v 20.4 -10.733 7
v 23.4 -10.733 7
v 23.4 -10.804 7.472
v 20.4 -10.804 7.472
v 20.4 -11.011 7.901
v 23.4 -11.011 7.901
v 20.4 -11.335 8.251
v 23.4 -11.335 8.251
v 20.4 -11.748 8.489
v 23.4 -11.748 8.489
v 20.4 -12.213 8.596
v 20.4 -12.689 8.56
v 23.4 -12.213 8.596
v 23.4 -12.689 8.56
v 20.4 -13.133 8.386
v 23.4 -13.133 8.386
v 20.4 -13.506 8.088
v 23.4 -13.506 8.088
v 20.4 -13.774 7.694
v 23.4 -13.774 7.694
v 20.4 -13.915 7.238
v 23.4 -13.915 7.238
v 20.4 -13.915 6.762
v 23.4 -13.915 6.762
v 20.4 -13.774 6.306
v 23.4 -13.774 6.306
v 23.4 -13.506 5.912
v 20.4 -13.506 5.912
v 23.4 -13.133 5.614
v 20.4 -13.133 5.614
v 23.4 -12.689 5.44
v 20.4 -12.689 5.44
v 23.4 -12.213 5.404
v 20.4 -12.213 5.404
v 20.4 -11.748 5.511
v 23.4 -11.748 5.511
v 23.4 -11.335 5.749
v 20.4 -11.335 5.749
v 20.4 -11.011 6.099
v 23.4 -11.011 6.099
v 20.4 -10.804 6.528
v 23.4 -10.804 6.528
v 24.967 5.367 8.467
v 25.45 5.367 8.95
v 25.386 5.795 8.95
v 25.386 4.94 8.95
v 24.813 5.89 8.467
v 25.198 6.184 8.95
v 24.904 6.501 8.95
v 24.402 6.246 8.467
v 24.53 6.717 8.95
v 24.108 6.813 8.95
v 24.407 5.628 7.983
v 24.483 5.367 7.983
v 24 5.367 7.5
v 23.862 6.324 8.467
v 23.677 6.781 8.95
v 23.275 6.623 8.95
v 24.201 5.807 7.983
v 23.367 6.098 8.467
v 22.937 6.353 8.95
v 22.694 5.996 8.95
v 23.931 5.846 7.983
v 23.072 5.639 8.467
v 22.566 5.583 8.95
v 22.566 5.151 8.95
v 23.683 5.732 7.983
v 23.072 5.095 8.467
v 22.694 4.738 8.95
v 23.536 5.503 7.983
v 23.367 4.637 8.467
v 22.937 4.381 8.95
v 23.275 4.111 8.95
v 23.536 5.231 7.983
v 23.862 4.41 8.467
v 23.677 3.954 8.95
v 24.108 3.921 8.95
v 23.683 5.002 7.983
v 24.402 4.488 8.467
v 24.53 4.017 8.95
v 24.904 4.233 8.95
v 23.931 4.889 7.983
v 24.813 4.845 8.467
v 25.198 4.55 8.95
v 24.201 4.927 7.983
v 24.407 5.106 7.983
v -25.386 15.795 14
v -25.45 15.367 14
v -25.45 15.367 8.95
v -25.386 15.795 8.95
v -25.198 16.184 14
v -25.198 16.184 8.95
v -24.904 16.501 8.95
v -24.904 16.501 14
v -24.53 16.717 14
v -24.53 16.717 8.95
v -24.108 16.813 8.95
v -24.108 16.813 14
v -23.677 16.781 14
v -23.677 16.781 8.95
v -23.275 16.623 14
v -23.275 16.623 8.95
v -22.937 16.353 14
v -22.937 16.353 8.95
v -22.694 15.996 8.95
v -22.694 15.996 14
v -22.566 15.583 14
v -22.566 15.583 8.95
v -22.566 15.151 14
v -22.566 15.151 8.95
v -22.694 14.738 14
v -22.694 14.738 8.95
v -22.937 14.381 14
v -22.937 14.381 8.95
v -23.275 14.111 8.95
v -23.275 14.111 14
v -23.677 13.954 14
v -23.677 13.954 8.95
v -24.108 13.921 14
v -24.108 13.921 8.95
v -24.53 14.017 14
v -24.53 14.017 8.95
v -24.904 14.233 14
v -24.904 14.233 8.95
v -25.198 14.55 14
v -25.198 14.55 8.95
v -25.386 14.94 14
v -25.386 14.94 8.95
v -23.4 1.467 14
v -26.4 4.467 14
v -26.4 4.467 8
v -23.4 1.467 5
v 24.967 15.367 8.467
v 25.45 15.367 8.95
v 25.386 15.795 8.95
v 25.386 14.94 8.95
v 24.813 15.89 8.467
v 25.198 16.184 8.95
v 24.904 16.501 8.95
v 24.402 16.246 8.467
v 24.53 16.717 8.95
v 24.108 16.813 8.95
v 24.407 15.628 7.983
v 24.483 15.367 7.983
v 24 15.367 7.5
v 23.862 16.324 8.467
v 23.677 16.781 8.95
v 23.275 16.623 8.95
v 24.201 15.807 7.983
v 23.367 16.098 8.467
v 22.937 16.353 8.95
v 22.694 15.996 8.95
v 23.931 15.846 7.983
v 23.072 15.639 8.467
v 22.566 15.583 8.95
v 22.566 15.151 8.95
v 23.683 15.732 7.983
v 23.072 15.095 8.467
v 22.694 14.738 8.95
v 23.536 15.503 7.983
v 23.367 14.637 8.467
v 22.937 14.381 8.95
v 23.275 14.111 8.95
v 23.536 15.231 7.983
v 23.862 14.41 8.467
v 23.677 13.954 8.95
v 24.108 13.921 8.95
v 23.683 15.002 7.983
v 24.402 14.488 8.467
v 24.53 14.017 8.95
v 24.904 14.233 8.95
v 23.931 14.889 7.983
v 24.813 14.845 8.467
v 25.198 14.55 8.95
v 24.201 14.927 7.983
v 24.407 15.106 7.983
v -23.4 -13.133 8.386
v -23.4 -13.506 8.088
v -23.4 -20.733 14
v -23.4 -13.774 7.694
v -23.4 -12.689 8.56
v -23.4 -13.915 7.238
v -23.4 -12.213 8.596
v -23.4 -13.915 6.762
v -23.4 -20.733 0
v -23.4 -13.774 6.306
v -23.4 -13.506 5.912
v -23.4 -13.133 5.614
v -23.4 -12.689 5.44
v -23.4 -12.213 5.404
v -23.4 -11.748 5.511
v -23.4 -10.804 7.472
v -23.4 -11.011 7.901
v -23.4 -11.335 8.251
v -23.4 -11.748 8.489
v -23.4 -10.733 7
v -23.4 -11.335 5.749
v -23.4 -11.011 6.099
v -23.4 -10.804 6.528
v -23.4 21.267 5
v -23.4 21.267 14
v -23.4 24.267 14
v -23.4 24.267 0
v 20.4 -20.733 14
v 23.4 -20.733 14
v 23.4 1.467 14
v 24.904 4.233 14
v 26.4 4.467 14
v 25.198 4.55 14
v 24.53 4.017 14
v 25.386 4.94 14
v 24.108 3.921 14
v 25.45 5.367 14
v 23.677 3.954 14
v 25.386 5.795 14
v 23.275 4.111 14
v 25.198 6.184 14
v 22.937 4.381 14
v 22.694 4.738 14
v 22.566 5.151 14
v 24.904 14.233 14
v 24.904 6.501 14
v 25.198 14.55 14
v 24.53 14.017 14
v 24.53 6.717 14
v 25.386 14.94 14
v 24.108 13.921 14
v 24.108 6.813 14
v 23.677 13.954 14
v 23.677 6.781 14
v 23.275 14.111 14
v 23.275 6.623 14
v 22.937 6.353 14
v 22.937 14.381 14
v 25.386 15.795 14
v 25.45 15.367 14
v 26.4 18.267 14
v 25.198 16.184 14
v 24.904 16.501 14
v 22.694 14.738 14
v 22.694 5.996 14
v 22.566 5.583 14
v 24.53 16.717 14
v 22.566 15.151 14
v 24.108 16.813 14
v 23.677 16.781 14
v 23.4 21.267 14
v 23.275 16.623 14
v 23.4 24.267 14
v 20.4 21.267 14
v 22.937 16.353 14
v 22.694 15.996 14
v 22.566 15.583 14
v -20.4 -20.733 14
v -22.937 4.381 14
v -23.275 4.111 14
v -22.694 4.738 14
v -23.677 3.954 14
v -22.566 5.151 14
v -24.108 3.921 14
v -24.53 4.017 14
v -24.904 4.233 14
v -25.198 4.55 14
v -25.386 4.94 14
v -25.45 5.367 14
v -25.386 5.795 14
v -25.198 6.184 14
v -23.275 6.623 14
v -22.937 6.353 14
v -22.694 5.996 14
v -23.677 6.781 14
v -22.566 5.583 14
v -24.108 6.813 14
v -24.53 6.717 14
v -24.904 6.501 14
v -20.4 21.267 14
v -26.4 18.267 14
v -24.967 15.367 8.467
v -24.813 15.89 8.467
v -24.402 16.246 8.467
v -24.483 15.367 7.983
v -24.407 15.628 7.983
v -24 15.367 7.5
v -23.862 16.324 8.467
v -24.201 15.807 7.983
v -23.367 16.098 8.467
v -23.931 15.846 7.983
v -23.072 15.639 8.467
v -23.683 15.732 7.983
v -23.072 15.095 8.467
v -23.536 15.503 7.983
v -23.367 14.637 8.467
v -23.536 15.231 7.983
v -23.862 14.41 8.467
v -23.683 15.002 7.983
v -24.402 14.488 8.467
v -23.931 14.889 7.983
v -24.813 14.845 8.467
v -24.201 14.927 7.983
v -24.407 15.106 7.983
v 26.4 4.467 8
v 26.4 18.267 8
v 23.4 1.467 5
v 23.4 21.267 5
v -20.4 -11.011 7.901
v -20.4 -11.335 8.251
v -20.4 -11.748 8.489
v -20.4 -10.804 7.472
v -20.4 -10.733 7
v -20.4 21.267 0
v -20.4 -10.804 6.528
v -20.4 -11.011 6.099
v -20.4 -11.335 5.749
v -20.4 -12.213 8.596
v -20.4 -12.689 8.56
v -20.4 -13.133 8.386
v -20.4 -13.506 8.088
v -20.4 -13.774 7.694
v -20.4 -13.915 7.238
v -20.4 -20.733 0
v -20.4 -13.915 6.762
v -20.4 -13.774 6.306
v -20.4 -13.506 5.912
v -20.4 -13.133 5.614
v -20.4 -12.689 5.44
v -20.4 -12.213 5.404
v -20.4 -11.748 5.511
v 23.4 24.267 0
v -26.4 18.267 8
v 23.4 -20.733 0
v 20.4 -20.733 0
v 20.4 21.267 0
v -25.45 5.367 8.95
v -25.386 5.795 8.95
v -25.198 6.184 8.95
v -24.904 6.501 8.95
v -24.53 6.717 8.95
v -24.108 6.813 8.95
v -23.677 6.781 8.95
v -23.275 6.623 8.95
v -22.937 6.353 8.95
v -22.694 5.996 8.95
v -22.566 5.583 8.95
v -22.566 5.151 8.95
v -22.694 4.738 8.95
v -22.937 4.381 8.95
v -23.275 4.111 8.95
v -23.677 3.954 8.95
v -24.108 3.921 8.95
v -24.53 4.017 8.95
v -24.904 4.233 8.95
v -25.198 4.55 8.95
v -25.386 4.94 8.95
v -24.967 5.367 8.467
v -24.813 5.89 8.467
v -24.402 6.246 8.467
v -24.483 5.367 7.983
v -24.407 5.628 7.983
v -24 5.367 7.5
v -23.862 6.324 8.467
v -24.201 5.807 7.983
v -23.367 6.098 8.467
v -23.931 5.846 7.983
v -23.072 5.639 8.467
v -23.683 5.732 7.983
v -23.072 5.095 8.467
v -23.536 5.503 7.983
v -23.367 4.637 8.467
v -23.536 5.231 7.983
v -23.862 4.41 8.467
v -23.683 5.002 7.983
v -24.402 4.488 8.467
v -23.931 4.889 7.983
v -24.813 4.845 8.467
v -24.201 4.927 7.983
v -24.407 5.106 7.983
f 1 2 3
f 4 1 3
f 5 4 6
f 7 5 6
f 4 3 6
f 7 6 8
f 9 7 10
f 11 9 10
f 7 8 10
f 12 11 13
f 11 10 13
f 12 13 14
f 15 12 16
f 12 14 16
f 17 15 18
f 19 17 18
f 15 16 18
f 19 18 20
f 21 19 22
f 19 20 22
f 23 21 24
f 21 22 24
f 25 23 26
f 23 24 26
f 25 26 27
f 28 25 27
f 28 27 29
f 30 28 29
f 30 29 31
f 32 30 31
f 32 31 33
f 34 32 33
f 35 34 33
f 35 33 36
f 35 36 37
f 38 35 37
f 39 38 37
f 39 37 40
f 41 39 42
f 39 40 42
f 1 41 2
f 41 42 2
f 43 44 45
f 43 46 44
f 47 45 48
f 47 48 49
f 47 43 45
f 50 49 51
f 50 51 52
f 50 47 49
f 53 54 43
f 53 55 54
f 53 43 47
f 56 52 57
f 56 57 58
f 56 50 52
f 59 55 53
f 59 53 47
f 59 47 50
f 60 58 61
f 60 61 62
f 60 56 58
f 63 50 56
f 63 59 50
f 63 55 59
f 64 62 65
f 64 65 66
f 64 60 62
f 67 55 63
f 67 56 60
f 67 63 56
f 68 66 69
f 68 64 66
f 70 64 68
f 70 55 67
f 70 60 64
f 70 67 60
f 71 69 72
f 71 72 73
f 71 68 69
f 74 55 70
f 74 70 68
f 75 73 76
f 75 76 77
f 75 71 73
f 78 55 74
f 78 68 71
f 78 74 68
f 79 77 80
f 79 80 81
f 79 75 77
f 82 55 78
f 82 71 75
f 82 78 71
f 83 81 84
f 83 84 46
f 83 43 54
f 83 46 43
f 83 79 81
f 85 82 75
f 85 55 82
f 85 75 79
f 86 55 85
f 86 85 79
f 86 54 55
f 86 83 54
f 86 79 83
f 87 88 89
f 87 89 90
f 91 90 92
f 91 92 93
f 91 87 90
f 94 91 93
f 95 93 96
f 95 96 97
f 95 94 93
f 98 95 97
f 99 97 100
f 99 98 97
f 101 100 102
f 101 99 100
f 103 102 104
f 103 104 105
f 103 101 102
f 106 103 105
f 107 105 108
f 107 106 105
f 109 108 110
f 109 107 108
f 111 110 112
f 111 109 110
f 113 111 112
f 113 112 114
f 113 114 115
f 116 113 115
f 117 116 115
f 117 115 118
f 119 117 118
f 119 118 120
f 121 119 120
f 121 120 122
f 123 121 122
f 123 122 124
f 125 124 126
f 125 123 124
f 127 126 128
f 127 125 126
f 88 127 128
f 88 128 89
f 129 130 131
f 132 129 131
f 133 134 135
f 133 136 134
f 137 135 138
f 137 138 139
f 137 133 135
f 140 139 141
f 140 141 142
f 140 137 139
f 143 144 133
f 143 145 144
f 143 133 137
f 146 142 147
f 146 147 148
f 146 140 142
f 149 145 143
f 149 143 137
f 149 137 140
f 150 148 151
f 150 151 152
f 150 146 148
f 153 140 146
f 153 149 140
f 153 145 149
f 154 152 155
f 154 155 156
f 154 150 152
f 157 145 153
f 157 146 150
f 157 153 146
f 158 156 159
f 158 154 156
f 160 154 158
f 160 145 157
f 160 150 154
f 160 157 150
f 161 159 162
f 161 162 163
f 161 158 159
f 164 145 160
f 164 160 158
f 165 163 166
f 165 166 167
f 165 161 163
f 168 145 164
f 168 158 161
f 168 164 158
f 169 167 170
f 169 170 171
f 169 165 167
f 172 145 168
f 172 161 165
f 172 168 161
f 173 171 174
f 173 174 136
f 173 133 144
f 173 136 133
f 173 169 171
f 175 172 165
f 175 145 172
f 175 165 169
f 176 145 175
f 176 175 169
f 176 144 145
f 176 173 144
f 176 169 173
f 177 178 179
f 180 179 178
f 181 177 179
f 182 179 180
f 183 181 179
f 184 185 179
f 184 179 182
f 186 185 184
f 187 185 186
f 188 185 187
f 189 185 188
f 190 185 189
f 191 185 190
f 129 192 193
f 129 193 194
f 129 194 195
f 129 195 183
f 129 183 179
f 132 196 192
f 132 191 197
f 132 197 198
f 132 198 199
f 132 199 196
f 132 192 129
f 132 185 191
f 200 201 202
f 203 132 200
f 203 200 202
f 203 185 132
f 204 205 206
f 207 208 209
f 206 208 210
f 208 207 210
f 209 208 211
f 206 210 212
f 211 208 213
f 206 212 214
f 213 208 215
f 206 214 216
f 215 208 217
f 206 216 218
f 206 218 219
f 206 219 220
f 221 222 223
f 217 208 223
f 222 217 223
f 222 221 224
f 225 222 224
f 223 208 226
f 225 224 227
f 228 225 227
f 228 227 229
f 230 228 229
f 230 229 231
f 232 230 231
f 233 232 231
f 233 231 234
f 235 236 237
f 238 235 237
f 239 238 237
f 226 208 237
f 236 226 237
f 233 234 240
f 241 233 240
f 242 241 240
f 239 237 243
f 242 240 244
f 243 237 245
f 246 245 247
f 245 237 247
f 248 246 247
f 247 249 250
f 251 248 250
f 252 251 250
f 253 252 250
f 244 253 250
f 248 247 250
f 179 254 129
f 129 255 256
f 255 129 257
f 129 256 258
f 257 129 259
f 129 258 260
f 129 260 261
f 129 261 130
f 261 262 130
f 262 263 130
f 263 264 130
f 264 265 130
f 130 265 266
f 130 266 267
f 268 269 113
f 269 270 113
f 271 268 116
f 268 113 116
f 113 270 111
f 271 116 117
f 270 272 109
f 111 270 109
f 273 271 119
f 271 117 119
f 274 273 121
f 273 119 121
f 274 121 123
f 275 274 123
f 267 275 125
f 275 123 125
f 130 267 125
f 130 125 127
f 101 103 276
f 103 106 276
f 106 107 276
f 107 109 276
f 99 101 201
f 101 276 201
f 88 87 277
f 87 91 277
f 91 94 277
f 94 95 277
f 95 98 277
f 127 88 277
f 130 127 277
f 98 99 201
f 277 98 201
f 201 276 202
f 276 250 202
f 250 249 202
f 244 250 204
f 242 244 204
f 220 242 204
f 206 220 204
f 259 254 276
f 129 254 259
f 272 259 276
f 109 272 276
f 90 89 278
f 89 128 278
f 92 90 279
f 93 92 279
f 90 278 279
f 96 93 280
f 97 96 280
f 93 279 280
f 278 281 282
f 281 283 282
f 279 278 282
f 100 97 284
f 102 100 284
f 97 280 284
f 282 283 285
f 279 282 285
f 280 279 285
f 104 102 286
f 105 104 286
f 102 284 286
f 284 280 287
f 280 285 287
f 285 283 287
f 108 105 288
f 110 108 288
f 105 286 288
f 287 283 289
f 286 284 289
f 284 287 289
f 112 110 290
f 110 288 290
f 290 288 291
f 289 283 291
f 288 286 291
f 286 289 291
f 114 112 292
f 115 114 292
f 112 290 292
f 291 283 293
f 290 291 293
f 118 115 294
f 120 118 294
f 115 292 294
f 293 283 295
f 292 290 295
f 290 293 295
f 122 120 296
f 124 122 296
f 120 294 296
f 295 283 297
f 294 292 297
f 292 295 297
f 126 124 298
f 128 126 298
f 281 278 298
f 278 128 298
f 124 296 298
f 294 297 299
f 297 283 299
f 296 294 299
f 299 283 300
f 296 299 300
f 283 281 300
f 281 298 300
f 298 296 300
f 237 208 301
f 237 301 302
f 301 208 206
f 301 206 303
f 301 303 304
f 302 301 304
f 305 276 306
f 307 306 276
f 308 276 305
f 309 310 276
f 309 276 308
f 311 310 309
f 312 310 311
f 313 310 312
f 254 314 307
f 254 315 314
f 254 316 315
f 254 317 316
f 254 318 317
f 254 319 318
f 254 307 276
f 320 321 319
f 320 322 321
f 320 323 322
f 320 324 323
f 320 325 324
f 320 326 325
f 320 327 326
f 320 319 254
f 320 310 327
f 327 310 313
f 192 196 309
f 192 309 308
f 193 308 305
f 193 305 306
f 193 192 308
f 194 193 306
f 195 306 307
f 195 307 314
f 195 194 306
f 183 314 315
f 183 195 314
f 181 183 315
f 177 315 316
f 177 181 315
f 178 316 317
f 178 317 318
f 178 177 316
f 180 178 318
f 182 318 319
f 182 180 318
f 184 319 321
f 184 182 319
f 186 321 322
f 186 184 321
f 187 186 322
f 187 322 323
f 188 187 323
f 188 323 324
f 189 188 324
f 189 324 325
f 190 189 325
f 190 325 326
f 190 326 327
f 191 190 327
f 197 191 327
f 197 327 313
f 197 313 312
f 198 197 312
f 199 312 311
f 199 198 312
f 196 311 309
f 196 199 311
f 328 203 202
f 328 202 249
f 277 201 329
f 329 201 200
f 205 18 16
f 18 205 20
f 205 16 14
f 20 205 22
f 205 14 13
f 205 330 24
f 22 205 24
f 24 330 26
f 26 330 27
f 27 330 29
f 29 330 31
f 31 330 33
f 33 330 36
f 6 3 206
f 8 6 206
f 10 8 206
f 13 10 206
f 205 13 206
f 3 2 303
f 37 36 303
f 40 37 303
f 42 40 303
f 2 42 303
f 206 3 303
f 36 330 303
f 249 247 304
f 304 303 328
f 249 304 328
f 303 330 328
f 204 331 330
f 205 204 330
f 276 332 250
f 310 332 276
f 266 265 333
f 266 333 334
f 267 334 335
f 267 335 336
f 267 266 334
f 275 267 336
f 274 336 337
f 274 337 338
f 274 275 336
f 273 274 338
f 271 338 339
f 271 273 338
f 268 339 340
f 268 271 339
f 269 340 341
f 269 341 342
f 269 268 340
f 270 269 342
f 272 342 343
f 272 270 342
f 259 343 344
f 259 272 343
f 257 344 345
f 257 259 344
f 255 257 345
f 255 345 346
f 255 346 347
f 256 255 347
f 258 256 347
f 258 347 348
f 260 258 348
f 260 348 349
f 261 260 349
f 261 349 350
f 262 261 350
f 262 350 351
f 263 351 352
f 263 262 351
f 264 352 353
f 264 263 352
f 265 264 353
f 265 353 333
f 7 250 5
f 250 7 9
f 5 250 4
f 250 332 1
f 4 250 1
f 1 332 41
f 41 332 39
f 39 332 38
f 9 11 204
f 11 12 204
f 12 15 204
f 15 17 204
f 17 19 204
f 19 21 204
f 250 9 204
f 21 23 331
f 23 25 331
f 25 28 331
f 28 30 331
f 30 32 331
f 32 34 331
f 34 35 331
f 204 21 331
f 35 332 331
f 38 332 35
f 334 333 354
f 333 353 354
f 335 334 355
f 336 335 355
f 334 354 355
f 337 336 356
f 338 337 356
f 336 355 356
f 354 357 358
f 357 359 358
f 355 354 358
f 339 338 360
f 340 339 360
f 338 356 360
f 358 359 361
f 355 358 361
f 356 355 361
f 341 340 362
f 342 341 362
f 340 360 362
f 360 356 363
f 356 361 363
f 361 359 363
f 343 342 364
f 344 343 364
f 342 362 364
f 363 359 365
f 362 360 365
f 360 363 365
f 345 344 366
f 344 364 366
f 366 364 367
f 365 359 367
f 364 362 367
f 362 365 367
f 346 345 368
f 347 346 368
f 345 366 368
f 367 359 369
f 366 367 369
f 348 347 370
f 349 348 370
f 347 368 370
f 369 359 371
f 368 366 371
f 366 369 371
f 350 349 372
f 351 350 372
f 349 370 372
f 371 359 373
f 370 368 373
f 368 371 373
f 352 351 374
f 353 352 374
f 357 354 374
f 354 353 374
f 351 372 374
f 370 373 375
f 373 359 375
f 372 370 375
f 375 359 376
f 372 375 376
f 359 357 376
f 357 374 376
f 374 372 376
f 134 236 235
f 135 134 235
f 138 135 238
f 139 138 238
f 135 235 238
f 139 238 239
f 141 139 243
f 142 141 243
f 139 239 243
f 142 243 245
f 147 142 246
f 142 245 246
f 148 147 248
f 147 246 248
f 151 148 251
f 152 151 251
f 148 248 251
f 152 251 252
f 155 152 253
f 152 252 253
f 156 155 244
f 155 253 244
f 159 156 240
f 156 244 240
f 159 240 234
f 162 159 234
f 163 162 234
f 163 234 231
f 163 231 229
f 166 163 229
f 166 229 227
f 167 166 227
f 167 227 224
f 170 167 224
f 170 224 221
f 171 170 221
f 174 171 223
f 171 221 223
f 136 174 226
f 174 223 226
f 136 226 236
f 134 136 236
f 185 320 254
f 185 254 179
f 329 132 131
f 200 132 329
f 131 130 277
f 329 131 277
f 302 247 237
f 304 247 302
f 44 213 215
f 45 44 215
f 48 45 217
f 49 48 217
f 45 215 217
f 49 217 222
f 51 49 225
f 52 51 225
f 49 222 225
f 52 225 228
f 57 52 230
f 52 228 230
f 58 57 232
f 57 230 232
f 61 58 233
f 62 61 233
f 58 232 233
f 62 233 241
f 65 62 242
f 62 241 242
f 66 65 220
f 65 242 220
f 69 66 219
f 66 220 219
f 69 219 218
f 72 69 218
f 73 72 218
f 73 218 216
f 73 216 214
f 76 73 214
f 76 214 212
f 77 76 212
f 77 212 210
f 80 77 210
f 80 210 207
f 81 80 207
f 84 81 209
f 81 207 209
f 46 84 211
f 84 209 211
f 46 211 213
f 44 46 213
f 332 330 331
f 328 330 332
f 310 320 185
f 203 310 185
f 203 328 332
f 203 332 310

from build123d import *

# Parameters (mm, degrees)
F1_DEPTH = 14
F2_W     = 6
F2_H     = 19.8
F3_DEPTH = 9
F4_R     = 1.45
F5_DEPTH = 6.5
F6_SIZE  = 2.99999
F7_R     = 1.6
F8_DEPTH = 3
F10_SIZE = 1.45


# Not quite as in the source:
# - a fillet or chamfer is up to 0.001 mm smaller than in the source, because OpenCascade refuses the exact size


with BuildPart() as f1:
    # F0 (on Top) → F1 (new body)
    with BuildSketch(Plane.XY):
        Polygon((0, 24.2671520197), (0, 21.2671520197), (20.4, 21.2671520197), (20.4, -20.7328479803), (23.4, -20.7328479803), (23.4, 24.2671520197), align=None)
    extrude(amount=F1_DEPTH)

    # F2 (on face) → F3 (join)
    with BuildSketch(Plane.XY.offset(14)):
        with Locations((23.4, 11.3671520197)):
            Rectangle(F2_W, F2_H)
    extrude(amount=-F3_DEPTH)

    # F4 (on face) → F5 (cut)
    with BuildSketch(Plane.XY.offset(14)):
        with Locations((24, 5.3671520197)):
            Circle(F4_R)
        with Locations((24, 15.3671520197)):
            Circle(F4_R)
    extrude(amount=-F5_DEPTH, mode=Mode.SUBTRACT)

    # F6 (size 3 in the source; OpenCascade refuses exactly that, so slightly less here)
    f6_edges = [f1.edges().sort_by_distance(p)[0] for p in [
        (26.4, 1.467152, 9.5),
        (26.4, 21.267152, 9.5),
        (26.4, 11.367152, 5),
    ]]
    chamfer(f6_edges, length=F6_SIZE)

    # F7 (on face) → F8 (cut, through all)
    with BuildSketch(Plane.YZ.offset(23.4)):
        with Locations((-12.3328479803, 7)):
            Circle(F7_R)
    extrude(amount=-F8_DEPTH, mode=Mode.SUBTRACT)

    # F9: F1 across plane


with BuildPart() as f1_1:
    add(f1.part)
    add(f1.part.mirror(Plane.YZ))

    # F10
    f10_edges = [f1_1.edges().sort_by_distance(p)[0] for p in [
        (22.55, 15.367152, 7.5),
        (22.55, 5.367152, 7.5),
        (-22.55, 5.367152, 7.5),
        (-22.55, 15.367152, 7.5),
    ]]
    chamfer(f10_edges, length=F10_SIZE)


solid = f1_1.part
